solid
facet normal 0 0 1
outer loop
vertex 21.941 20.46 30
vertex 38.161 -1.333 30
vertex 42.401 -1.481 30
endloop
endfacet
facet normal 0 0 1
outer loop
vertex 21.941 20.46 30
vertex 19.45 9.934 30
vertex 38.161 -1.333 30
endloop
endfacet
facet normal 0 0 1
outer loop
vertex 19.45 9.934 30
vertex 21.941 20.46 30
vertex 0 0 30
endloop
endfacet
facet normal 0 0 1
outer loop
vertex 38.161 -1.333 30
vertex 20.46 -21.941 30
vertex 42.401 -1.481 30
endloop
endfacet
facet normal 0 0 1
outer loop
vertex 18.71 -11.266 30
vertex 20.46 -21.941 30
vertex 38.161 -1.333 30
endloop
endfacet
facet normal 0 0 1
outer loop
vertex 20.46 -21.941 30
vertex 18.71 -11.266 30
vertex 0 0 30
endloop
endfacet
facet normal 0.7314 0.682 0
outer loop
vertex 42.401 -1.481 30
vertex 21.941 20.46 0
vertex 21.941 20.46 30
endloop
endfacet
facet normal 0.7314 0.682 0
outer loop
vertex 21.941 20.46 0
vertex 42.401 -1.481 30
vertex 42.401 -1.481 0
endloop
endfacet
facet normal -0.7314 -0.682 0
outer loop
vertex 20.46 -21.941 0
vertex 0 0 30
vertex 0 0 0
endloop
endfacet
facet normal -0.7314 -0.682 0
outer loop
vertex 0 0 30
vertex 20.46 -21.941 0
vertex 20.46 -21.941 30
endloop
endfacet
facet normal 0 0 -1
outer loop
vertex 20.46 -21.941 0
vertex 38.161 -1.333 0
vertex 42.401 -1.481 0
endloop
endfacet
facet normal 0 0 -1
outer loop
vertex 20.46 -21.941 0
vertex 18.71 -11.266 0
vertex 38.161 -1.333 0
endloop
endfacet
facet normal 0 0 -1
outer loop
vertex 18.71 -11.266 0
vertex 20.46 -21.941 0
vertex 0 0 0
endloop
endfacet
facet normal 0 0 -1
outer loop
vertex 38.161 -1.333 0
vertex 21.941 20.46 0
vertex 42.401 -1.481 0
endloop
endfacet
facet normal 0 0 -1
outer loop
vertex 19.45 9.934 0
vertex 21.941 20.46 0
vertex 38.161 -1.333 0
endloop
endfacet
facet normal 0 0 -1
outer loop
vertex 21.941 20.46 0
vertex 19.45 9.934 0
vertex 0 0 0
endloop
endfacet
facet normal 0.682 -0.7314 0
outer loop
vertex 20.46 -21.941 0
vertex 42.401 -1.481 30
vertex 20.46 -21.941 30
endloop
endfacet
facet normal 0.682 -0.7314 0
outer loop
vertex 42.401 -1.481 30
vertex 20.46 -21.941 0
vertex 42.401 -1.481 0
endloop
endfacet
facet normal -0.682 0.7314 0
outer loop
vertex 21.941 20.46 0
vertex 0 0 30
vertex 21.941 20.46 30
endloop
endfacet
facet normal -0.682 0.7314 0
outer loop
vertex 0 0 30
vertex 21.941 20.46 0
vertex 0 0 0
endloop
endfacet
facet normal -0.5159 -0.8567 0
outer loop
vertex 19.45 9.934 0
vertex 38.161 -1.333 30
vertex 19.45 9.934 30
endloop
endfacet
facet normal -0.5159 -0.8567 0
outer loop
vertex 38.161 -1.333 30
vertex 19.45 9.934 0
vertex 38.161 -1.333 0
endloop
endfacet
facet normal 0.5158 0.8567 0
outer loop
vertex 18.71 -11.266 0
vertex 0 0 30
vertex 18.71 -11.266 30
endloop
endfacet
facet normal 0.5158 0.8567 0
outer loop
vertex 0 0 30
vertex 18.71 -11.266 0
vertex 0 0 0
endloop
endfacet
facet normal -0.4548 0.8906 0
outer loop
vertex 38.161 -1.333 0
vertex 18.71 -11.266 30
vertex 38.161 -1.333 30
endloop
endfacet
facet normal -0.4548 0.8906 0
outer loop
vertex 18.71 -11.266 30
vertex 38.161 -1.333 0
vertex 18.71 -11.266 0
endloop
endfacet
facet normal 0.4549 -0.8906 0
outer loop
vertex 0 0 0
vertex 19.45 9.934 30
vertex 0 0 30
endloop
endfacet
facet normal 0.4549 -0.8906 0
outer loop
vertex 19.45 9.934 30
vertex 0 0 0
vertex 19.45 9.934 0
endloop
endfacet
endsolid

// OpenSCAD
rotate([0,0,-92])
rotate([0,-90,0]){
    difference(){
        rotate([-45,0,0]) {
            cube([30, 30, 30]);
        }
        scale([1,0.9,0.5]) {
            rotate([-45,0,0]) {
                cube([30, 30, 30]);
            }
        }
    }
}
